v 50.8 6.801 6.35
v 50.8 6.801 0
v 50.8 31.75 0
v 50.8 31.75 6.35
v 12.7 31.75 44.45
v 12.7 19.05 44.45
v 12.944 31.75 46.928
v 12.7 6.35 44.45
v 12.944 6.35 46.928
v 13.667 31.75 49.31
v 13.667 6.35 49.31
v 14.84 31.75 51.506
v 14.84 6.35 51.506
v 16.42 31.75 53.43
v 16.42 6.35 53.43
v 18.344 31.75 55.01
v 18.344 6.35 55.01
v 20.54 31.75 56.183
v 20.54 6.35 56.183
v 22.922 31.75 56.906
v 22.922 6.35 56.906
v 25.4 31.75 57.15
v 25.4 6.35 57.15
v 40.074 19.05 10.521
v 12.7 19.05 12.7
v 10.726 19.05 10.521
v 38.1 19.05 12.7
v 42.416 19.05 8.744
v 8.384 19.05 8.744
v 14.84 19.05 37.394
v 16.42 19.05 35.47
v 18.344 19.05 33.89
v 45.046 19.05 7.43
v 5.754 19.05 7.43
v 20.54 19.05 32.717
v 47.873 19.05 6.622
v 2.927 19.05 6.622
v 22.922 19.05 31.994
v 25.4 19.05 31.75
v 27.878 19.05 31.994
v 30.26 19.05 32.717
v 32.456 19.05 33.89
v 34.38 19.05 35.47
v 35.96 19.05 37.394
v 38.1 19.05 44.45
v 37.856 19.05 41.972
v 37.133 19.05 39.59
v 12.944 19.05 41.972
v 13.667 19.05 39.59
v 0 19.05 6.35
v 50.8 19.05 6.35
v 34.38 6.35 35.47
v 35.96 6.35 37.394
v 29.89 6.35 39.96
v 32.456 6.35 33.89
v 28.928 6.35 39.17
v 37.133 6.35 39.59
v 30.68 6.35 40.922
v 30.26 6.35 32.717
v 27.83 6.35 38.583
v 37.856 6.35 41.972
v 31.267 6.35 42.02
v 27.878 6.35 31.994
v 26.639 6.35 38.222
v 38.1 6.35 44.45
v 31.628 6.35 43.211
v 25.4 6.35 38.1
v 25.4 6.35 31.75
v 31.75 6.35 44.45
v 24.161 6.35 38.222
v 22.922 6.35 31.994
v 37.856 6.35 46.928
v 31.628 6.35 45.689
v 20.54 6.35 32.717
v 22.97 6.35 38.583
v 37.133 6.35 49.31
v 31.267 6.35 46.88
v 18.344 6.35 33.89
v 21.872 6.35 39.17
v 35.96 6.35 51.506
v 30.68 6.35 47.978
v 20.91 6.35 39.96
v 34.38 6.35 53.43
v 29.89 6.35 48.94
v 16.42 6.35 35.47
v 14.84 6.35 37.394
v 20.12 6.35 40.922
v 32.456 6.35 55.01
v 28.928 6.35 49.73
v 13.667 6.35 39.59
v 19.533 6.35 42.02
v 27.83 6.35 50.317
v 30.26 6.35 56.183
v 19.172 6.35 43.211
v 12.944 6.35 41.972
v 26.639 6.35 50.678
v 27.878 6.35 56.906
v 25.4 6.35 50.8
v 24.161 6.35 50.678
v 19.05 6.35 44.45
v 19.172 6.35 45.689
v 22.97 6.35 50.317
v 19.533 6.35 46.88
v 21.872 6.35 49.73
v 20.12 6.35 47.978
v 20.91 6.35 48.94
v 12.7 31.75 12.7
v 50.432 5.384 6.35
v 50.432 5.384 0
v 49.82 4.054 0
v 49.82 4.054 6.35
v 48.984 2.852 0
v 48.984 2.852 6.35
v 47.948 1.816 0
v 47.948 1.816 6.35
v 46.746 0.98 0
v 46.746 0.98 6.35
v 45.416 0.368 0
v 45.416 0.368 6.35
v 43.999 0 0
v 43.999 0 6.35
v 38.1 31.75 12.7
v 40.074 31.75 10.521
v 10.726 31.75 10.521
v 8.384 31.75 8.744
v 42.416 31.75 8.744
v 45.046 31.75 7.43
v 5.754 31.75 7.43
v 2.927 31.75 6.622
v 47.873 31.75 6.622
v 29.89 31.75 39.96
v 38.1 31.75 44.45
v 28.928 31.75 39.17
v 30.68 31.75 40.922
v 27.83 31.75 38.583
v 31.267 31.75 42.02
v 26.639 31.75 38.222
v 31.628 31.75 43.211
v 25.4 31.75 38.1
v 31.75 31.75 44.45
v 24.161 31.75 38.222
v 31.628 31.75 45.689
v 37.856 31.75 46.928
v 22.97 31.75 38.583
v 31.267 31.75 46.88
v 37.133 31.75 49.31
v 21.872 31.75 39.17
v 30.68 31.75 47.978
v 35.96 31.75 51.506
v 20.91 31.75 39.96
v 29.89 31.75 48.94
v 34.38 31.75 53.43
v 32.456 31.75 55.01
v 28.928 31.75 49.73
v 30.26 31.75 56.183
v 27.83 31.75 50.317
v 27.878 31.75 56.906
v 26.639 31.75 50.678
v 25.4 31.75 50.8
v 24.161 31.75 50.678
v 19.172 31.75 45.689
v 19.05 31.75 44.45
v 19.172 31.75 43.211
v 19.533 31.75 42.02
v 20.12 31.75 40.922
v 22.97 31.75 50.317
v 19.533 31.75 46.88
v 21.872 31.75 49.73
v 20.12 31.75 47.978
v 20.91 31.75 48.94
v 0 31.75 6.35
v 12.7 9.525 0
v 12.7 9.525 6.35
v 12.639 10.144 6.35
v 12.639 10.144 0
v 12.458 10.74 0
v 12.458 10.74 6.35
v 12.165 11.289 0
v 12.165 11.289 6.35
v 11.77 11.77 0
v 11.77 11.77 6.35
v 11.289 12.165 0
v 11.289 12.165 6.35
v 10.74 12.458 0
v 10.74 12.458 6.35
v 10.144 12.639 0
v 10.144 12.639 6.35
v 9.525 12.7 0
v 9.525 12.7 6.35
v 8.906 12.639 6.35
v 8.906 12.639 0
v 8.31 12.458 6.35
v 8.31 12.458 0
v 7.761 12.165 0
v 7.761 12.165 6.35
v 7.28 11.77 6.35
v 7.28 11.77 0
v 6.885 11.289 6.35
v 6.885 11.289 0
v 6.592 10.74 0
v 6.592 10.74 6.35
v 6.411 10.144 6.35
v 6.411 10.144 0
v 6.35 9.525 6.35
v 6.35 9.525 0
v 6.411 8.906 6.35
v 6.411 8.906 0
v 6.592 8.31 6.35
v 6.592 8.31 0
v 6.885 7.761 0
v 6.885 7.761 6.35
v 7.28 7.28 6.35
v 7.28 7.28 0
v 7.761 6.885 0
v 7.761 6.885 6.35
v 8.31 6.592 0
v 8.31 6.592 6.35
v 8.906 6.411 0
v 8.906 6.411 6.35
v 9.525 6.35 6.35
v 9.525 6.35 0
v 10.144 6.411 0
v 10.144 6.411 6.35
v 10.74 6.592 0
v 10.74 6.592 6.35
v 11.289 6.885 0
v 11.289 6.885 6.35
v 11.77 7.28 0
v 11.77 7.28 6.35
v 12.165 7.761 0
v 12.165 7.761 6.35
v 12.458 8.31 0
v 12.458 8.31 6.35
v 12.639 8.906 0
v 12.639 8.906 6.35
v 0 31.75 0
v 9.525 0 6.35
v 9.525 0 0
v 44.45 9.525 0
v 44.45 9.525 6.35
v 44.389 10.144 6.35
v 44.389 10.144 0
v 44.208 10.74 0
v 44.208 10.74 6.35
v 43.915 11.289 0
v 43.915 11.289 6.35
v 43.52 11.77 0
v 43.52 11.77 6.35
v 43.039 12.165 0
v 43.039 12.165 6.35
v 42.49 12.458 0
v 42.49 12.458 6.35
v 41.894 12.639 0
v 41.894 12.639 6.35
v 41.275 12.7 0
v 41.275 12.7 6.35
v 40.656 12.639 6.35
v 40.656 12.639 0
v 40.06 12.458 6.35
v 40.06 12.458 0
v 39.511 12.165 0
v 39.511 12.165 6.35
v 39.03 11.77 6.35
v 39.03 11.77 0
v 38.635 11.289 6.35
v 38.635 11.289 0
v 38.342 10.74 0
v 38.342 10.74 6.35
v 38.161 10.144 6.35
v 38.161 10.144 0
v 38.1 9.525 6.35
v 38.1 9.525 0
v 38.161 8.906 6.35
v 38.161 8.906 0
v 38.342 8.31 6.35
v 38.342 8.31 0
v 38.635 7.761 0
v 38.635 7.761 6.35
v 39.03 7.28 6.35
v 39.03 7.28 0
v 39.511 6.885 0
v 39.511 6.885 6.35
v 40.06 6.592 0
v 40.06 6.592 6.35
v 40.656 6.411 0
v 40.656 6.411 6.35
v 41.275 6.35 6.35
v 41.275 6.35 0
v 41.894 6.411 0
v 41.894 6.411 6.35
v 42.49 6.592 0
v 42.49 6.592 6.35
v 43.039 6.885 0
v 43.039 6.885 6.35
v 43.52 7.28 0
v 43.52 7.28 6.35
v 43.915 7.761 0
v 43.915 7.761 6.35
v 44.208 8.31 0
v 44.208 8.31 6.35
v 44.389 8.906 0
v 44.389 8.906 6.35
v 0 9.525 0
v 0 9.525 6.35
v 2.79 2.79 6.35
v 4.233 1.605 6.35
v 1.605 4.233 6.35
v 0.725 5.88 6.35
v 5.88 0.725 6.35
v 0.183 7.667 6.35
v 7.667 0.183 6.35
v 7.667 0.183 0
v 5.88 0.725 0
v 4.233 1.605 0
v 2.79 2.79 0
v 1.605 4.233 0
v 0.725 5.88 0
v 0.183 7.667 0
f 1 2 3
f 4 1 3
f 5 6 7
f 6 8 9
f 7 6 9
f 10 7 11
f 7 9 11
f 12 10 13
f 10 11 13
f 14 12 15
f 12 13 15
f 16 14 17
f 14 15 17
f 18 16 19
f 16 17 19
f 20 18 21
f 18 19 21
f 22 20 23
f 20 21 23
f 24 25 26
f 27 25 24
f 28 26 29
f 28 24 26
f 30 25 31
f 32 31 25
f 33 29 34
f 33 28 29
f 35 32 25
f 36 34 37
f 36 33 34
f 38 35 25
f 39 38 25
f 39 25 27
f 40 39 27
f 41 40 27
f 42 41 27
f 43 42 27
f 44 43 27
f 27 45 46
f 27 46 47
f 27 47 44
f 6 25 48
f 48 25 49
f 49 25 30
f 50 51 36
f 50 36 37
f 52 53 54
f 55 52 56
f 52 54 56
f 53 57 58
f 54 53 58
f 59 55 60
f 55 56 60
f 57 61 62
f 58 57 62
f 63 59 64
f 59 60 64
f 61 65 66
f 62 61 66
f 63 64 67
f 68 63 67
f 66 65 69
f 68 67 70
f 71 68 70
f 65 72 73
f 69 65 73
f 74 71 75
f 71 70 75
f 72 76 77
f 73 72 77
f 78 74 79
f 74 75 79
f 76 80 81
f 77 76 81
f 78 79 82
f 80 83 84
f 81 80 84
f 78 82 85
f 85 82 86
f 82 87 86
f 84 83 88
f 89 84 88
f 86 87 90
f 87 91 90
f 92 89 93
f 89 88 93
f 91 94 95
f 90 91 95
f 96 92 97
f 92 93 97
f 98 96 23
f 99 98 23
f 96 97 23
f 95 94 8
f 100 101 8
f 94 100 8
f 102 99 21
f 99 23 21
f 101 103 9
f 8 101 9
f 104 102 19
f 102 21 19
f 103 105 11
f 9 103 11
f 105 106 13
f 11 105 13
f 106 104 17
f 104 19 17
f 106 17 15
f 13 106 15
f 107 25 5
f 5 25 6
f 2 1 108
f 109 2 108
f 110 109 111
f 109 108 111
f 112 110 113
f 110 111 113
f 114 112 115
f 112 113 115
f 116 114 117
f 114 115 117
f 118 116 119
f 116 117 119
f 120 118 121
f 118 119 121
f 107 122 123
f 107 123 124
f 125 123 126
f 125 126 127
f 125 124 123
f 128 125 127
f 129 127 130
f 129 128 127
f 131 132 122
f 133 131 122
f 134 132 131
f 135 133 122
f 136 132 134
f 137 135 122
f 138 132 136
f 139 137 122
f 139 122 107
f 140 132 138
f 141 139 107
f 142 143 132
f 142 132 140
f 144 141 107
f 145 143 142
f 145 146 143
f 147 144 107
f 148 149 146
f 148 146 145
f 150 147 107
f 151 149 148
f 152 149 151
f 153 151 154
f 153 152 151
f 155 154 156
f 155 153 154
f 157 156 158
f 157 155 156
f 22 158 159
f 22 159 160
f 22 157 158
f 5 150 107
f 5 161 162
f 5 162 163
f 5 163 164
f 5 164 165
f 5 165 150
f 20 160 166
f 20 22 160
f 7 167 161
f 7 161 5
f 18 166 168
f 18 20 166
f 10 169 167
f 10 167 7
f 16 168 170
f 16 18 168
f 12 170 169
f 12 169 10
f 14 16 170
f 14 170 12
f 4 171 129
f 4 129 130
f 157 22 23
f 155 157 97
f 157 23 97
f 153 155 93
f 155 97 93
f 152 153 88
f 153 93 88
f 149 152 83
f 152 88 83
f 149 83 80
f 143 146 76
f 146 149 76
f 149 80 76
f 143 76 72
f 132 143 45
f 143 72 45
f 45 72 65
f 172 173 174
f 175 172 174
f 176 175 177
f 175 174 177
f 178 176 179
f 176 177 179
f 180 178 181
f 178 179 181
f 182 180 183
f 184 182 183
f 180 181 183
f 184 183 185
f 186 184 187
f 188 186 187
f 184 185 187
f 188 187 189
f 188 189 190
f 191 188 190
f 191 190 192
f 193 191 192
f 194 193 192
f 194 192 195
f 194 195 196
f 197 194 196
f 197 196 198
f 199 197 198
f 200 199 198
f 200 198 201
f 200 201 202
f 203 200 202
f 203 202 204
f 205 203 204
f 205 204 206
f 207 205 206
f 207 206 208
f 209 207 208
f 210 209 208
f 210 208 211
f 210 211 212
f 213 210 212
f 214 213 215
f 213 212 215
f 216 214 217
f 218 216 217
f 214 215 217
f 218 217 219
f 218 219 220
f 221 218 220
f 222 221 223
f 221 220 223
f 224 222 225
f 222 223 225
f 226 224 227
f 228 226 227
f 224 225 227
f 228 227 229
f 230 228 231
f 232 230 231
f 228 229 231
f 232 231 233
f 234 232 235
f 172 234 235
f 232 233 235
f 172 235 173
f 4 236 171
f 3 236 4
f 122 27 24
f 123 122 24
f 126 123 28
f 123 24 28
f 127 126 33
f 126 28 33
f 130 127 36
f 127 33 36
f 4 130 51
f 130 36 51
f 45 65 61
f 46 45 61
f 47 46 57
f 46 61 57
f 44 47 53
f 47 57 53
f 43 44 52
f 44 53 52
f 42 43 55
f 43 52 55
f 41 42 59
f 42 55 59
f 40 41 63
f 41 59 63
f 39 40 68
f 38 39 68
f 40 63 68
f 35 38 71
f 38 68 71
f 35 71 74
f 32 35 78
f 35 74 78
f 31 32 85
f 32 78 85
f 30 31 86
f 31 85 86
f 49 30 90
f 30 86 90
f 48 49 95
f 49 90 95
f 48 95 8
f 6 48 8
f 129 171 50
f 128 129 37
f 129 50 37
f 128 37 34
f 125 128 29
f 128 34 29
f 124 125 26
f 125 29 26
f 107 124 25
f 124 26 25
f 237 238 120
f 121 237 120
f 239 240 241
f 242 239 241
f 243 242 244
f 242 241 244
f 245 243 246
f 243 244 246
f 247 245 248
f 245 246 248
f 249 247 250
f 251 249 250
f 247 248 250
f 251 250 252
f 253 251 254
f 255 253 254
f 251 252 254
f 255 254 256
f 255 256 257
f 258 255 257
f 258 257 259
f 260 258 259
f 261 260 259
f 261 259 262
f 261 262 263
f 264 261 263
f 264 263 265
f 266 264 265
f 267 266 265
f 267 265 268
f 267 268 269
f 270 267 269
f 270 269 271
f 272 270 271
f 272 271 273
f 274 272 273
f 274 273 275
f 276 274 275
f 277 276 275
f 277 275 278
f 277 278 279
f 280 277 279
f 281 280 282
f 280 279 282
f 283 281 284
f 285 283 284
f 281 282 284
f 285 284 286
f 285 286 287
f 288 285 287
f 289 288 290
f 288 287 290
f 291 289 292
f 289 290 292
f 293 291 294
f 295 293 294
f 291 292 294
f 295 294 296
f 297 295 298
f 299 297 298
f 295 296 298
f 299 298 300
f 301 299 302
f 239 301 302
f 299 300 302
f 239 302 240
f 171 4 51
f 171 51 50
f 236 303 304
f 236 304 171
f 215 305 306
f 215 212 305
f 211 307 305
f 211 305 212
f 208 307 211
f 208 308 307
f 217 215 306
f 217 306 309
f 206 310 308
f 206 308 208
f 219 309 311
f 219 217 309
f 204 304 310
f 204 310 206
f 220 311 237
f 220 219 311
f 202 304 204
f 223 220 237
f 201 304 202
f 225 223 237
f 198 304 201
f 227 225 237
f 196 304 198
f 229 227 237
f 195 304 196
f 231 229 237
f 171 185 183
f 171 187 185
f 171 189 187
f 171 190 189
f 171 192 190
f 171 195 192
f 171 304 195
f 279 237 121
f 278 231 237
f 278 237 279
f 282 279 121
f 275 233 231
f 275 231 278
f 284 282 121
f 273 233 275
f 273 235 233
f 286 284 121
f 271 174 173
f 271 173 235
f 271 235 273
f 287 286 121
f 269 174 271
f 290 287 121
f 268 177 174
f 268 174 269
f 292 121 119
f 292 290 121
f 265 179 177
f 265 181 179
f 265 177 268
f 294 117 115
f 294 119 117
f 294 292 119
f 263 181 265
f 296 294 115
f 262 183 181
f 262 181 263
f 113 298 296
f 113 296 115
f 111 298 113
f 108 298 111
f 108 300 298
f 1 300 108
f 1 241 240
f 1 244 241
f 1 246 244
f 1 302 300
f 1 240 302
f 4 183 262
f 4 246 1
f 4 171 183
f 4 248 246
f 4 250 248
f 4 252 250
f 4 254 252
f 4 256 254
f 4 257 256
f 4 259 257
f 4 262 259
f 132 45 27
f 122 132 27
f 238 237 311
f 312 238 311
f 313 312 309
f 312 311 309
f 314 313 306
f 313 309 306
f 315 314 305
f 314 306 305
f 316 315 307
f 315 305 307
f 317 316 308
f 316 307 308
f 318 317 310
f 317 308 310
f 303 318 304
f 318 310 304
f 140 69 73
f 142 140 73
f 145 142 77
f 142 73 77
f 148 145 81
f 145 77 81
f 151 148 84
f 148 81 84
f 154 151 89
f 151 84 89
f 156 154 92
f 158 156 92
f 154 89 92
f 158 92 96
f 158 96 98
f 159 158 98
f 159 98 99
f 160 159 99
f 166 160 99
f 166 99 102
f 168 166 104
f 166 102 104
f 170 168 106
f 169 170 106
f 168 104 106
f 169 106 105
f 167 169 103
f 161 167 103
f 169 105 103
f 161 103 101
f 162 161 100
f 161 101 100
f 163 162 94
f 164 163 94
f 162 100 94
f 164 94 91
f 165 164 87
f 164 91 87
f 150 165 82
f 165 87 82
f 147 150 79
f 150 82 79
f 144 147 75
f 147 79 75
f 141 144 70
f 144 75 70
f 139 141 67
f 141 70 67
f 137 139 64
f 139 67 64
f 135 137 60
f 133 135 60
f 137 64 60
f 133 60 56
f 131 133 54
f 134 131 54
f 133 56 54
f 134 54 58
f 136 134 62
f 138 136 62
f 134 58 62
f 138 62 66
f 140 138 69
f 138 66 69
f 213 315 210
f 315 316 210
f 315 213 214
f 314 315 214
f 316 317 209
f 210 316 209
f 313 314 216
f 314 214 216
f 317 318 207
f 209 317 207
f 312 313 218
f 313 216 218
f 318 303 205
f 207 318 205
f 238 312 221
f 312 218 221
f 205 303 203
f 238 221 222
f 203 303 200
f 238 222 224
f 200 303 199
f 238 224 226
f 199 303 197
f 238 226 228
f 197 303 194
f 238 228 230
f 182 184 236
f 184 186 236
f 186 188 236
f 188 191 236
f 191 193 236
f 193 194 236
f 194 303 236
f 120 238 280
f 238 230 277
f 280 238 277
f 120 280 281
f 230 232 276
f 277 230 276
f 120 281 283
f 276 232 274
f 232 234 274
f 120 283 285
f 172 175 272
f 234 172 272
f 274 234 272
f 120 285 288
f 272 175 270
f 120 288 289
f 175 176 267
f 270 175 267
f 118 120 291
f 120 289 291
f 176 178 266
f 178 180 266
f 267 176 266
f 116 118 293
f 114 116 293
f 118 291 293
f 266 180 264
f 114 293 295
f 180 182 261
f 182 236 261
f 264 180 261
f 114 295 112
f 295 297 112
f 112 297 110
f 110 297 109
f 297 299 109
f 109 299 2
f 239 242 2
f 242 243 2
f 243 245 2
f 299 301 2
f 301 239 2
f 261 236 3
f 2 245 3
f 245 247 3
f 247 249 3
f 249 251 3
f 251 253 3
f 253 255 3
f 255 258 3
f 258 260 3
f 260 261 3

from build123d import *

# Parameters (mm, degrees)
F0_W      = 50.8
F0_H      = 31.75
F1_DEPTH  = 6.35
F2_R      = 3.175
F3_DEPTH  = 25.4
F4_W      = 50.8
F4_H      = 50.8
F5_DEPTH  = 25.4
F7_DEPTH  = 31.75
F9_DEPTH  = 12.7
F10_R     = 6.35
F11_DEPTH = 25.4


with BuildPart() as f1:
    # F0 (on Top) → F1 (new body)
    with BuildSketch(Plane.XY):
        with Locations((25.4, 15.875)):
            Rectangle(F0_W, F0_H)
    extrude(amount=F1_DEPTH)

    # F2 (on face) → F3 (cut)
    with BuildSketch(Plane.XY.offset(6.35)):
        with BuildLine():
            ThreePointArc((9.525, 0), (2.7898079092, 2.7898079092), (0, 9.525))
            Line((0, 9.525), (0, 0))
            Line((0, 0), (9.525, 0))
        make_face()
        with Locations((9.525, 9.525)):
            Circle(F2_R)
        with Locations((41.275, 9.525)):
            Circle(F2_R)
        with BuildLine():
            ThreePointArc((50.8, 6.8012806053), (48.4888474552, 2.3111525448), (43.9987193947, 0))
            Line((43.9987193947, 0), (50.8, 0))
            Line((50.8, 0), (50.8, 6.8012806053))
        make_face()
    extrude(amount=-F3_DEPTH, mode=Mode.SUBTRACT)


with BuildPart() as f5:
    # F4 (on face) → F5 (new body)
    with BuildSketch(Plane(origin=(0, 31.75, 0), x_dir=(-1, 0, 0), z_dir=(0, 1, 0))):
        with Locations((-25.4, 31.75)):
            Rectangle(F4_W, F4_H)
    extrude(amount=-F5_DEPTH)

    # F6 (on face) → F7 (cut)
    with BuildSketch(Plane.XZ.offset(-6.35)):
        with BuildLine():
            Line((12.7, 12.7), (12.7, 44.45))
            ThreePointArc((12.7, 44.45), (16.4197438789, 53.4302561211), (25.4, 57.15))
            Line((25.4, 57.15), (0, 57.15))
            Line((0, 57.15), (0, 6.35))
            ThreePointArc((0, 6.35), (7.0995158286, 8.0259683429), (12.7, 12.7))
        make_face()
        with BuildLine():
            ThreePointArc((25.4, 57.15), (34.3802561211, 53.4302561211), (38.1, 44.45))
            Line((38.1, 44.45), (38.1, 12.7))
            ThreePointArc((38.1, 12.7), (43.7004841714, 8.0259683429), (50.8, 6.35))
            Line((50.8, 6.35), (50.8, 57.15))
            Line((50.8, 57.15), (25.4, 57.15))
        make_face()
    extrude(amount=-F7_DEPTH, mode=Mode.SUBTRACT)

    # F8 (on face) → F9 (cut)
    with BuildSketch(Plane.XZ.offset(-6.35)):
        with BuildLine():
            Line((38.1, 12.7), (38.1, 44.45))
            ThreePointArc((38.1, 44.45), (25.4, 31.75), (12.7, 44.45))
            Line((12.7, 44.45), (12.7, 12.7))
            ThreePointArc((12.7, 12.7), (7.0995158286, 8.0259683429), (0, 6.35))
            Line((0, 6.35), (50.8, 6.35))
            ThreePointArc((50.8, 6.35), (43.7004841714, 8.0259683429), (38.1, 12.7))
        make_face()
    extrude(amount=-F9_DEPTH, mode=Mode.SUBTRACT)

    # F10 (on face) → F11 (cut)
    with BuildSketch(Plane.XZ.offset(-6.35)):
        with Locations((25.4, 44.45)):
            Circle(F10_R)
    extrude(amount=-F11_DEPTH, mode=Mode.SUBTRACT)


solid = Compound([f1.part, f5.part])
